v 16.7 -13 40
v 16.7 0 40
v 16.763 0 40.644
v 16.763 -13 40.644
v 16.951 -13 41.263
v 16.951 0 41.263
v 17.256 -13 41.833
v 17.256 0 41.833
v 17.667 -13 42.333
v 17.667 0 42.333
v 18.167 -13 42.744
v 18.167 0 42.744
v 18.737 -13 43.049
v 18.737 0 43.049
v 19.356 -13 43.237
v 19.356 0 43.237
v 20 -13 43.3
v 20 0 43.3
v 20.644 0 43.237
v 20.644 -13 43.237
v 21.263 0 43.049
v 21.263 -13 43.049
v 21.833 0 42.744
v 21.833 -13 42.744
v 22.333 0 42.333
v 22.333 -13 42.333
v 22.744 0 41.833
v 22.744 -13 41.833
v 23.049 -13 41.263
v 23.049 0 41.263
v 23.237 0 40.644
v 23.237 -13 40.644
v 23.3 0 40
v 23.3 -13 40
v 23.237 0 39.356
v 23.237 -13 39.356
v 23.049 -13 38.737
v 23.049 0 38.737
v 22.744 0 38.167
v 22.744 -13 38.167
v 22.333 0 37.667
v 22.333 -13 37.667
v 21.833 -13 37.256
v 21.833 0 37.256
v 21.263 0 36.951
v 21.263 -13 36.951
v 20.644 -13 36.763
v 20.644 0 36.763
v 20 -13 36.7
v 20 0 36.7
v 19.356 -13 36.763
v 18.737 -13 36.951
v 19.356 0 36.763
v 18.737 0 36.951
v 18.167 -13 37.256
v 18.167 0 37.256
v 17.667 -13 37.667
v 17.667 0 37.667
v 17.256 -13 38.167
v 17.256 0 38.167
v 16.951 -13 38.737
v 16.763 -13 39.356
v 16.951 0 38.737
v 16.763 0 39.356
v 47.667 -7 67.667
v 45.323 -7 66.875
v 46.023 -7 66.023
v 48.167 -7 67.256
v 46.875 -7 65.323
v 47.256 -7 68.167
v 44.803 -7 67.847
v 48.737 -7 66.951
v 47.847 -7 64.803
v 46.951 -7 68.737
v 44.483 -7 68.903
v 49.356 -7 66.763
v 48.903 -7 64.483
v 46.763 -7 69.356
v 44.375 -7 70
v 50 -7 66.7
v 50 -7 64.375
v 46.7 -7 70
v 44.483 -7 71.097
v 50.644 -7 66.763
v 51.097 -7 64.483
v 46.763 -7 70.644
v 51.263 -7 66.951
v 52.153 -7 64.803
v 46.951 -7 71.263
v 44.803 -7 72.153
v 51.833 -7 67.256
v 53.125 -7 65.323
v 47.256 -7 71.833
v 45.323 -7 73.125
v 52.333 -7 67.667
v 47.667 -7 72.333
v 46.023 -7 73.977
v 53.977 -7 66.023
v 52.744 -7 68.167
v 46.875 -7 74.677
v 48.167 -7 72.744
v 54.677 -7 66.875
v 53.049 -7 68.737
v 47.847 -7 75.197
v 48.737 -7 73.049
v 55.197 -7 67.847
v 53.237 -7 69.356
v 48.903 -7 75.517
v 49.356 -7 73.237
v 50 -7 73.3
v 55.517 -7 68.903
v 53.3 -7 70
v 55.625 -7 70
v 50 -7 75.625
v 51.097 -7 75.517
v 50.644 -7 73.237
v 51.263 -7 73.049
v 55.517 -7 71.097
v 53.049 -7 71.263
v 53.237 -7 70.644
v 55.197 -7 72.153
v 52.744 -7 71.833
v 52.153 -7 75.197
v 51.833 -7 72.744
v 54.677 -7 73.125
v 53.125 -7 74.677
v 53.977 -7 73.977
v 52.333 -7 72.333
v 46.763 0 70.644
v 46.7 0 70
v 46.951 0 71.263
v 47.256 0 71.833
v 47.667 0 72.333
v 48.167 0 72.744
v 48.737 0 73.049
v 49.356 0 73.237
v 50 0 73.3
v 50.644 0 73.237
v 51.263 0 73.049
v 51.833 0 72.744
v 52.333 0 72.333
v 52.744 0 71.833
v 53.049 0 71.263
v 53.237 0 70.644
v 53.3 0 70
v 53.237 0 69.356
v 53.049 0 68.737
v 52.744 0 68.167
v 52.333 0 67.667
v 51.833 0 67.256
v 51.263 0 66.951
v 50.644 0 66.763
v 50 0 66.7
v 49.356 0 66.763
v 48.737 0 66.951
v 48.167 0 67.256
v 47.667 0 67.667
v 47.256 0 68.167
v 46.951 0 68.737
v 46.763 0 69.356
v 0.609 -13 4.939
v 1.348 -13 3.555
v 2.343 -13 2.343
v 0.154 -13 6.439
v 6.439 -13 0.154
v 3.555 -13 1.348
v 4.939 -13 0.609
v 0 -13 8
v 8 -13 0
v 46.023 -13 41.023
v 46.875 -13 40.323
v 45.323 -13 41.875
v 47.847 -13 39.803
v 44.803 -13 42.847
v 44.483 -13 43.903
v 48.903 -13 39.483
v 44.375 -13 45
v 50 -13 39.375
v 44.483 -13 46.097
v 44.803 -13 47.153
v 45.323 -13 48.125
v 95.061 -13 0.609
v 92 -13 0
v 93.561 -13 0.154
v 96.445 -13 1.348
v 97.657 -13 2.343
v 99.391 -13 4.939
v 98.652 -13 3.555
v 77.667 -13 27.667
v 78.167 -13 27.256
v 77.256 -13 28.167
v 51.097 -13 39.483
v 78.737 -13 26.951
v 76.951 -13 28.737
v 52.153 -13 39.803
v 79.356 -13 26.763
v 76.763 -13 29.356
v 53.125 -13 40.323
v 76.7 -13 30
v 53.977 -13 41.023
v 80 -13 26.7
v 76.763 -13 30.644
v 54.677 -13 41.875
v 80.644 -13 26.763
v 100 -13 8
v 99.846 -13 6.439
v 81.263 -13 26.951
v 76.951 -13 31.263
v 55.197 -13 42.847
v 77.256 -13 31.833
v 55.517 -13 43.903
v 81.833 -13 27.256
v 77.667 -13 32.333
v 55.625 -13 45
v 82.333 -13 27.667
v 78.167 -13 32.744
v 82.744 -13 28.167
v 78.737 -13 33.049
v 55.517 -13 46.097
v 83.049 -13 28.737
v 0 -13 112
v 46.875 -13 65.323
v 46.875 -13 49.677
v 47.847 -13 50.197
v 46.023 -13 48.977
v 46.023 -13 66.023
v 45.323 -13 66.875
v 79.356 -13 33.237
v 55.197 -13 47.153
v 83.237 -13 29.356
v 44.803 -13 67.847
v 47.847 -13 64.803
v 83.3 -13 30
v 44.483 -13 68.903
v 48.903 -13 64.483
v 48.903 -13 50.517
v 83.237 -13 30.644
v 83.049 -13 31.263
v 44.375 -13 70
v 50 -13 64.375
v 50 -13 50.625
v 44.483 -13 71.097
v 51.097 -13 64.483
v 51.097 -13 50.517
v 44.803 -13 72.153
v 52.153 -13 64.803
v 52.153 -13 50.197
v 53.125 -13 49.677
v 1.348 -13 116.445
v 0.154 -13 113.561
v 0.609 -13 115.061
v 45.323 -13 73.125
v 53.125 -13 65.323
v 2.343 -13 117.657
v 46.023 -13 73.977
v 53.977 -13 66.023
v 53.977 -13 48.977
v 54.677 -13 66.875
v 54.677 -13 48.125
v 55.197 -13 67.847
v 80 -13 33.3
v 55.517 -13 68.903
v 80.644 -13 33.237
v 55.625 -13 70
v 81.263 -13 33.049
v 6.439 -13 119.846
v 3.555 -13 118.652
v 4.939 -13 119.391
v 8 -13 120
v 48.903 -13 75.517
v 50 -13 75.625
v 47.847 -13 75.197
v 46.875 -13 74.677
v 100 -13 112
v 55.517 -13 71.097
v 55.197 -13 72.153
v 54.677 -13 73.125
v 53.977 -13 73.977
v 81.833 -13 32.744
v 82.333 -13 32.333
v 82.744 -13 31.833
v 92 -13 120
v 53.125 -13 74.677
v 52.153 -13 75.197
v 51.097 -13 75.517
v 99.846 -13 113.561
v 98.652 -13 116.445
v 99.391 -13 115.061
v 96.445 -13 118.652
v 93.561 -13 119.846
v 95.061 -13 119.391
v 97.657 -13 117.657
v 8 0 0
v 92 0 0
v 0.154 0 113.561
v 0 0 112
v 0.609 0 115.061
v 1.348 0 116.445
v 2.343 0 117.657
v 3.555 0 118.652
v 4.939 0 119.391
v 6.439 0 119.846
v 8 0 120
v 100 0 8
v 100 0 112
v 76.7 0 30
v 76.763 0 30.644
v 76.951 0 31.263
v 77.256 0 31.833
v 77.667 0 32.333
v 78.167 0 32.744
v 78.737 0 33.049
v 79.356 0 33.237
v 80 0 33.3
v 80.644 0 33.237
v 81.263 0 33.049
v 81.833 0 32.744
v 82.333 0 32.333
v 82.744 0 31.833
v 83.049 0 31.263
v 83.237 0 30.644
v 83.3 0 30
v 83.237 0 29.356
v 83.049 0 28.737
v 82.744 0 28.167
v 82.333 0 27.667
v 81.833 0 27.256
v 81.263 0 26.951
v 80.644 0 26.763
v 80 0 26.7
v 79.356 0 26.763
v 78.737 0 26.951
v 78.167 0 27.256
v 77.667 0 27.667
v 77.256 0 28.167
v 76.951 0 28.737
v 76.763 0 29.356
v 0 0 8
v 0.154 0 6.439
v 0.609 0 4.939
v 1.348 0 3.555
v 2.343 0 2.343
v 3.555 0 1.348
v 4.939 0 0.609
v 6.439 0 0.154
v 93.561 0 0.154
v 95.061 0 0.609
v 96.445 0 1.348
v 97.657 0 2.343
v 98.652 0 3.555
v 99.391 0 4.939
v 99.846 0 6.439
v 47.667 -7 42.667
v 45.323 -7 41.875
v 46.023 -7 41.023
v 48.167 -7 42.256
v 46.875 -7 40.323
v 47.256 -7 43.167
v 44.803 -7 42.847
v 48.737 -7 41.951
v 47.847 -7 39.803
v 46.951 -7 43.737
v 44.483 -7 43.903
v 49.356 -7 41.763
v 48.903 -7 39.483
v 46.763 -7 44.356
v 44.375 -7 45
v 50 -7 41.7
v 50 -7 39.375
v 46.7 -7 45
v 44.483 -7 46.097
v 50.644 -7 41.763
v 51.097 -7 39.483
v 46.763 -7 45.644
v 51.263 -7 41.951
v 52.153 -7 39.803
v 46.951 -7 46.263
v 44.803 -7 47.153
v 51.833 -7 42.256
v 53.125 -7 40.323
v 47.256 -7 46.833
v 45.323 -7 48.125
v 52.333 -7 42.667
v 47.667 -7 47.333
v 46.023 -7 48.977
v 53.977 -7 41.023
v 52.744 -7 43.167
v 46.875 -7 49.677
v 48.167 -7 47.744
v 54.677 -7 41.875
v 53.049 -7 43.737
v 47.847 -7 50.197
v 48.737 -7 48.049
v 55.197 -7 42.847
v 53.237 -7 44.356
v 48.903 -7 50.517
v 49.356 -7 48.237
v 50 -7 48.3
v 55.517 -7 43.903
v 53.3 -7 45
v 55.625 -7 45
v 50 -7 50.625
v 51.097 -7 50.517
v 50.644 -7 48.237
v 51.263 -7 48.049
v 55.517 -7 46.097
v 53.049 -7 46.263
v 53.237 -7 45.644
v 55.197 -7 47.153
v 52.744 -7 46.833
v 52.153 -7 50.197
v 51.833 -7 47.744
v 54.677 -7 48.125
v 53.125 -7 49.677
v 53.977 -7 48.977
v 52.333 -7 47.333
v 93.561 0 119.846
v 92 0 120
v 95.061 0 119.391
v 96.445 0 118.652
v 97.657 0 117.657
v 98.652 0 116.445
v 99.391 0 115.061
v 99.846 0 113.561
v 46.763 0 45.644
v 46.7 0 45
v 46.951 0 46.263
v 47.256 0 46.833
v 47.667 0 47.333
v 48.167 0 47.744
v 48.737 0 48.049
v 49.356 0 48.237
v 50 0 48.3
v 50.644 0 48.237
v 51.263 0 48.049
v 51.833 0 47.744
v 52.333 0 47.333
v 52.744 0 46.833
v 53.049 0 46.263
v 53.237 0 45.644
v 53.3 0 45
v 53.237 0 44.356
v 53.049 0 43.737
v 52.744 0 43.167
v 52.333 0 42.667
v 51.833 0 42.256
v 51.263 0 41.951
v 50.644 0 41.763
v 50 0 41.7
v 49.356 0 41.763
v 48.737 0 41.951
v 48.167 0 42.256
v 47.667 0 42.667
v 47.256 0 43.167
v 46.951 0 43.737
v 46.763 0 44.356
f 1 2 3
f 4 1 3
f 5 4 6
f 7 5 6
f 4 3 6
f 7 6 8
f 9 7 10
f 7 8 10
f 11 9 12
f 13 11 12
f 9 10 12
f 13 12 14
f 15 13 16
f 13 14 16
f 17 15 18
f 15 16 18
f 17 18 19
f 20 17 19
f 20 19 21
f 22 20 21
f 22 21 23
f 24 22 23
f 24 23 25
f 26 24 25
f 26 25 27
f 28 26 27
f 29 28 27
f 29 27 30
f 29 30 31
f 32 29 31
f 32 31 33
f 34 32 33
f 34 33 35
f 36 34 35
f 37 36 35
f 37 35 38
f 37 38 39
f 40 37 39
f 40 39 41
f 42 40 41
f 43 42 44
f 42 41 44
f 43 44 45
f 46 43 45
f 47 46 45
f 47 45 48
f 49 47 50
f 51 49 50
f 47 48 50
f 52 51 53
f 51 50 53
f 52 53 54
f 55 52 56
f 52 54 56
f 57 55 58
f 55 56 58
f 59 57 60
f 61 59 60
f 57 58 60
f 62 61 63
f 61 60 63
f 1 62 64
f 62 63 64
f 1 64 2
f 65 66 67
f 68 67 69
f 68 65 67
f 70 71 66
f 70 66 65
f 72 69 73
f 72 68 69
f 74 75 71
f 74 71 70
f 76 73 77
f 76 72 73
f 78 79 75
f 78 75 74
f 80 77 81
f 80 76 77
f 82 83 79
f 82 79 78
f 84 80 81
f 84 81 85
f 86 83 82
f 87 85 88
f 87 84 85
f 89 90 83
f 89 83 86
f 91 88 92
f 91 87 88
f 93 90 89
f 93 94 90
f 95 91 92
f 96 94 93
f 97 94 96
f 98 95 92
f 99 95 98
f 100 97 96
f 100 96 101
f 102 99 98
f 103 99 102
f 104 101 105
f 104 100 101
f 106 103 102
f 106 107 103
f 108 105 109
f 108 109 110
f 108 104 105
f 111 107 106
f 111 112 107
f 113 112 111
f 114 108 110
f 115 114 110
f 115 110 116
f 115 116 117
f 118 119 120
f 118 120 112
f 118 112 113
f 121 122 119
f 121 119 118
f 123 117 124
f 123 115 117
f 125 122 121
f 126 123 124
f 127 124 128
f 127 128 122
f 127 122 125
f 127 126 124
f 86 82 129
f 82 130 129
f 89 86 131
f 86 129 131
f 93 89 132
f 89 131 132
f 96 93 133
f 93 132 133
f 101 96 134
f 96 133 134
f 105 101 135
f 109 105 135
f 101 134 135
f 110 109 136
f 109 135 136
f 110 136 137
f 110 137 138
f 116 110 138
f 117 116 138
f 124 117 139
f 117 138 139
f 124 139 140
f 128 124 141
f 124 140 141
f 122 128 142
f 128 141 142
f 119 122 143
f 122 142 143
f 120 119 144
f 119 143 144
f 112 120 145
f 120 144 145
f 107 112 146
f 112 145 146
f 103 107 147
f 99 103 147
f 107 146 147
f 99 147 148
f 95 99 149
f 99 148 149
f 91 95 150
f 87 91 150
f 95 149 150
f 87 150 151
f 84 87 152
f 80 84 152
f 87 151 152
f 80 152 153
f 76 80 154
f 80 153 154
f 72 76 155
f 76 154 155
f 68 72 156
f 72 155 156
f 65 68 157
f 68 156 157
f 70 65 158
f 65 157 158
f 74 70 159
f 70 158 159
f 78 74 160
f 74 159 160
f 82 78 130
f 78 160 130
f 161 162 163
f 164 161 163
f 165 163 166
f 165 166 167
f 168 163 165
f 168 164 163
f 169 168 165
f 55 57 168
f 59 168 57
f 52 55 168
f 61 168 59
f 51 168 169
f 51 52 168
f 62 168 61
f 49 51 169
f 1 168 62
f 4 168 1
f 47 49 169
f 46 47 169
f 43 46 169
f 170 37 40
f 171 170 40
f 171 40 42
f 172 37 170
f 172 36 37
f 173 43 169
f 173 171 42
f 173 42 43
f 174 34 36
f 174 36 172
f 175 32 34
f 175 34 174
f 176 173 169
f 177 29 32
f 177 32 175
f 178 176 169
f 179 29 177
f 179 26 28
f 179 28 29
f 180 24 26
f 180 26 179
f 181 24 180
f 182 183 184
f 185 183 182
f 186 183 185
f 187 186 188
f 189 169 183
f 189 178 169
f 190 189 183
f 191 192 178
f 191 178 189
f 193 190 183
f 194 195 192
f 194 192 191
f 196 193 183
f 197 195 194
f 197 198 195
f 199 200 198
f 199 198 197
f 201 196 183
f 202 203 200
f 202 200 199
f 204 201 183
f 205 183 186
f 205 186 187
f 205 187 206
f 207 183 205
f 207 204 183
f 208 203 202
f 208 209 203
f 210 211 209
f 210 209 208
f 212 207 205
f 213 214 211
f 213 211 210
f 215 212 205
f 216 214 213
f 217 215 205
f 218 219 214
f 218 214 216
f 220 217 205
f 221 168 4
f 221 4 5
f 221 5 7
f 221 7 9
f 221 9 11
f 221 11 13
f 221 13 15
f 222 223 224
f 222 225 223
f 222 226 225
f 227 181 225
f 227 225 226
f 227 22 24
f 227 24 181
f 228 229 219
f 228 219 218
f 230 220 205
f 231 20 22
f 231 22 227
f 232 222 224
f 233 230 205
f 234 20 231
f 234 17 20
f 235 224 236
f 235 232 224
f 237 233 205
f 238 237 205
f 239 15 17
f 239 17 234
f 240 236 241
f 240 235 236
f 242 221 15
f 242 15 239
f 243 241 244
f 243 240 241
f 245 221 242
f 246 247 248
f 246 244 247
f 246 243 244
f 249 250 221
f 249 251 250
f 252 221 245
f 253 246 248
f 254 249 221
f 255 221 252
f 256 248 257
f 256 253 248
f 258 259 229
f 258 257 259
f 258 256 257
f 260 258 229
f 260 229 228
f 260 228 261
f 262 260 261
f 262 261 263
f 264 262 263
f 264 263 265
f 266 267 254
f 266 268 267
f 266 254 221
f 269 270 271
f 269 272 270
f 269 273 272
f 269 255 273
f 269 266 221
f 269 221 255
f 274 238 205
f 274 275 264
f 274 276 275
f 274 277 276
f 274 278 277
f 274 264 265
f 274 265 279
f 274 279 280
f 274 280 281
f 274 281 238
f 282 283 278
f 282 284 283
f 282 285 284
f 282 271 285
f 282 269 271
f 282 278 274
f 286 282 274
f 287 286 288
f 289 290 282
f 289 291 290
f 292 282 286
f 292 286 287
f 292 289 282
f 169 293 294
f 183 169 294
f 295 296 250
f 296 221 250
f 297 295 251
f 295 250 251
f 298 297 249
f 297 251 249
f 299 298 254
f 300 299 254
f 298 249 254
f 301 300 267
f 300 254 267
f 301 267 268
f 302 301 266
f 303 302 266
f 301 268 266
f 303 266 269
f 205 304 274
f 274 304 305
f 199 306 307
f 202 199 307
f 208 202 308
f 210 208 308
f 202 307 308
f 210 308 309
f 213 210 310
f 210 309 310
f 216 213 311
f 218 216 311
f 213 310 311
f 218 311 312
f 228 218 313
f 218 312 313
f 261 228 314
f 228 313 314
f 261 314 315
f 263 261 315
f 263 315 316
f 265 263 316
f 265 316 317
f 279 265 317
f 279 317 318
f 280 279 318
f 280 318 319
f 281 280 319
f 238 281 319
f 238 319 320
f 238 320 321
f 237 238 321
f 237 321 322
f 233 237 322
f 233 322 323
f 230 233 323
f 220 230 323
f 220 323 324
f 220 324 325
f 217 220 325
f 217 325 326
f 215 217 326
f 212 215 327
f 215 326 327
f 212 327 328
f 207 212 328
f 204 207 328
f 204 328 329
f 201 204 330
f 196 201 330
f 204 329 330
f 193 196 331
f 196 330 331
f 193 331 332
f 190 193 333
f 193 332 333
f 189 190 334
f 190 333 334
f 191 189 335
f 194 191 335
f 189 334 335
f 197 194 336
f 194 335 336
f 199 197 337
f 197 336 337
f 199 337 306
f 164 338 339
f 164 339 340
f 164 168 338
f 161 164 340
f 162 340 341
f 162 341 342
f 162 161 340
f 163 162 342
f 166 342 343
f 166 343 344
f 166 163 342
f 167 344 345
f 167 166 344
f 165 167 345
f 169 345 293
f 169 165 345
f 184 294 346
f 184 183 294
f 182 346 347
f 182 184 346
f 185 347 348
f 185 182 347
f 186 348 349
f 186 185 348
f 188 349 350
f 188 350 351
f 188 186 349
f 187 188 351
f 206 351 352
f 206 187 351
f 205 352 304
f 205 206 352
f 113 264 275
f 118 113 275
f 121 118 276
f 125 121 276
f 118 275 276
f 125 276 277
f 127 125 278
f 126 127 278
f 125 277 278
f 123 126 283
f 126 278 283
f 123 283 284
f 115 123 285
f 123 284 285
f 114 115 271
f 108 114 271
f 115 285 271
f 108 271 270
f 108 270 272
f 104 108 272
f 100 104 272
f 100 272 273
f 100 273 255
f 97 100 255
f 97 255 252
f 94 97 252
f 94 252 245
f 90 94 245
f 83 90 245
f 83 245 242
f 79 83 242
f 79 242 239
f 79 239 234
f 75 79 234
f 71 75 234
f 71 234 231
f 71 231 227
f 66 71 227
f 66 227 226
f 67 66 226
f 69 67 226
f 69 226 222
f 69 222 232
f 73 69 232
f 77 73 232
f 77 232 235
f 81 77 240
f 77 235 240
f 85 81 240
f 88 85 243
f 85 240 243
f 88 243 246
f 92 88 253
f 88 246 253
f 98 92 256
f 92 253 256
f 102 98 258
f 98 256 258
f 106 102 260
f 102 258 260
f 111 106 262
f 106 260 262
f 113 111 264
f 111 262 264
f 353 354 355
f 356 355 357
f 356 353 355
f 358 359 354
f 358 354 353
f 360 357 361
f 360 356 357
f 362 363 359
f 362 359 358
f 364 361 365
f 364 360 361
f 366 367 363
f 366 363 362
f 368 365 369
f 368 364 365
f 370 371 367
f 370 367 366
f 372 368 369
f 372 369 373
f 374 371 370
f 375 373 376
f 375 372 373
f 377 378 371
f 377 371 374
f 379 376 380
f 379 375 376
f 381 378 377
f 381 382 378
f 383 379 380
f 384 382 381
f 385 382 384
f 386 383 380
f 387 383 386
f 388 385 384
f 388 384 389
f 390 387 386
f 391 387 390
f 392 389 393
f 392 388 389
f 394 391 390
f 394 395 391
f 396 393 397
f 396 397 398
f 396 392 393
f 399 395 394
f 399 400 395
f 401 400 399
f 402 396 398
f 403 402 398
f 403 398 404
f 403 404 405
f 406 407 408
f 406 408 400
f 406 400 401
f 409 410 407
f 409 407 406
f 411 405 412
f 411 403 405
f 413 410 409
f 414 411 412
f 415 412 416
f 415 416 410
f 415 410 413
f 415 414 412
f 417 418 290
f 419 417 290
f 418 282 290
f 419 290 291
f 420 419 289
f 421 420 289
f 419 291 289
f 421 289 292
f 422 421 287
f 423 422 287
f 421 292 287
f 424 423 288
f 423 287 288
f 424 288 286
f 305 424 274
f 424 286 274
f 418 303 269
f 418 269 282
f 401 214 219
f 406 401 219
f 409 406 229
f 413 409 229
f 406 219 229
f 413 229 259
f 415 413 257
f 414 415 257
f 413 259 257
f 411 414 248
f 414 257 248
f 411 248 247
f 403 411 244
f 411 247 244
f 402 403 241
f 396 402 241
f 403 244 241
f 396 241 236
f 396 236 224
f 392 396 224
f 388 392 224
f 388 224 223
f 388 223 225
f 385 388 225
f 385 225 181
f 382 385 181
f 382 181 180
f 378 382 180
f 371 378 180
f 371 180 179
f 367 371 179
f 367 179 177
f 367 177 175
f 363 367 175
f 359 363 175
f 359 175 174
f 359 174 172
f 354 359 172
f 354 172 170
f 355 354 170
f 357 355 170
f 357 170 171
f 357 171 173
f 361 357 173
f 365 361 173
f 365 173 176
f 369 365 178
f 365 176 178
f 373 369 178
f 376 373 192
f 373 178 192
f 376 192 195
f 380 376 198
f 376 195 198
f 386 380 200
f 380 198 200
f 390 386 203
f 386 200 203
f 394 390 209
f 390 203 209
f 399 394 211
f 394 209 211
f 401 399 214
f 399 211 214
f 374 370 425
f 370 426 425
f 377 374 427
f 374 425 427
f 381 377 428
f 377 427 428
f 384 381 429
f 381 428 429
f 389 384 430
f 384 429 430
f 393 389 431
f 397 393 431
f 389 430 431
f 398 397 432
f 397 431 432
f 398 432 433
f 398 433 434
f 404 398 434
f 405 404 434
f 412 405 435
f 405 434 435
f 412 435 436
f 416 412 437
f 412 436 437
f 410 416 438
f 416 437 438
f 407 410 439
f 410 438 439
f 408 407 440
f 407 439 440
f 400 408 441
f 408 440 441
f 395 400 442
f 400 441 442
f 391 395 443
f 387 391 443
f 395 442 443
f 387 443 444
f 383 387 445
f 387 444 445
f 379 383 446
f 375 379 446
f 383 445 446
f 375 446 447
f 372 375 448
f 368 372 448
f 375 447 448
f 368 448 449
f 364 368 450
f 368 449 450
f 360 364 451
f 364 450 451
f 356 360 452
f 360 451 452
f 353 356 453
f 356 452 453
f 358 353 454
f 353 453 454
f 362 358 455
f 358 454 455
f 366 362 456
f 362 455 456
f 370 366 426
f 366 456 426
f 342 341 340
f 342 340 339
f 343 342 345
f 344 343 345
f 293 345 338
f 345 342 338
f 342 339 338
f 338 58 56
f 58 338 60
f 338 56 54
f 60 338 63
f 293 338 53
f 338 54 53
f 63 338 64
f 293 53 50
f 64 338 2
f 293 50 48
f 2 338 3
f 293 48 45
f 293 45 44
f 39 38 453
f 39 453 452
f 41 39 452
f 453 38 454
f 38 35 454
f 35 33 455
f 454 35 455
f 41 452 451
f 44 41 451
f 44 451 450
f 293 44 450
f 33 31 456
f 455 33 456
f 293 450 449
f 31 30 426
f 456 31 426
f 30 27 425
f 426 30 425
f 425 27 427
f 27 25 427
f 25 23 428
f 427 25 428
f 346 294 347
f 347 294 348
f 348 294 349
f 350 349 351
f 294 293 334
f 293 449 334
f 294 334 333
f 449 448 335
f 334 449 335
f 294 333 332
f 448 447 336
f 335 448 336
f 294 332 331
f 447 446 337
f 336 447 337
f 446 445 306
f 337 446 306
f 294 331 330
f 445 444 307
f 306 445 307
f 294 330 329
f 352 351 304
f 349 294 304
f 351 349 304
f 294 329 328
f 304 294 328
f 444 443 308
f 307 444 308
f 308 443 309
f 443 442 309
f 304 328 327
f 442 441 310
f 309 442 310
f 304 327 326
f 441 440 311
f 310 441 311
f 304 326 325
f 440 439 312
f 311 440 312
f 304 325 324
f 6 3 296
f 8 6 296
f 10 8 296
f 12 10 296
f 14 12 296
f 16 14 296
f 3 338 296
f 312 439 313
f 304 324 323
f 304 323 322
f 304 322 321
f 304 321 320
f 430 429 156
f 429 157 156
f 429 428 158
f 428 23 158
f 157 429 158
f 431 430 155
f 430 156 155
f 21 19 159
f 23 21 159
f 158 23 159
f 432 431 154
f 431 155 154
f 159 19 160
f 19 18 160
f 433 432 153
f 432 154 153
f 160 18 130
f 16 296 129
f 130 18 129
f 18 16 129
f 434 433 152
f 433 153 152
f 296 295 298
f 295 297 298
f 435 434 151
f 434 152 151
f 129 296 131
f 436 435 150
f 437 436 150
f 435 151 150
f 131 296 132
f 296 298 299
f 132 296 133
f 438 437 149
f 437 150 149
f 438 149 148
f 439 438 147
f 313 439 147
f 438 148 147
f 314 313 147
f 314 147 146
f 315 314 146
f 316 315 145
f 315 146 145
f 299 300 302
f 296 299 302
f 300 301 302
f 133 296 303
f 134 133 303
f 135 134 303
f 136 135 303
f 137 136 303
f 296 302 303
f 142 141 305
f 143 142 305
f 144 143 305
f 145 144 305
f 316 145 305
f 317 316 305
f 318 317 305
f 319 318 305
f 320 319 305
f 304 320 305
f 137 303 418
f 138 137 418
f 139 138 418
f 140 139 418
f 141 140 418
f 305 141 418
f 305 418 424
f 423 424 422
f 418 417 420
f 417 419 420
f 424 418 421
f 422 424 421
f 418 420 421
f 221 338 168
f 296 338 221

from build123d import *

# Parameters (mm, degrees)
F0_W           = 100
F0_H           = 120
F1_DEPTH       = 13
F3_D           = 6.6
F4_D           = 6.6
F4_CBORE_D     = 11.25
F4_CBORE_DEPTH = 6
F5_R           = 8


with BuildPart() as f1:
    # F0 (on Front) → F1 (new body)
    with BuildSketch(Plane.XZ):
        with Locations((50, 60)):
            Rectangle(F0_W, F0_H)
    extrude(amount=F1_DEPTH)

    # F3 (through all)
    with Locations(Plane.XZ.offset(13)):
        with Locations((80, 30), (20, 40)):
            Hole(F3_D / 2)

    # F4 (through all)
    with Locations(Plane.XZ.offset(13)):
        with Locations((50, 70), (50, 45)):
            CounterBoreHole(F4_D / 2, F4_CBORE_D / 2, F4_CBORE_DEPTH)

    # F5
    f5_edges = [f1.edges().sort_by_distance(p)[0] for p in [
        (100, -6.5, 120),
        (100, -6.5, 0),
        (0, -6.5, 120),
        (0, -6.5, 0),
    ]]
    fillet(f5_edges, radius=F5_R)


solid = f1.part
